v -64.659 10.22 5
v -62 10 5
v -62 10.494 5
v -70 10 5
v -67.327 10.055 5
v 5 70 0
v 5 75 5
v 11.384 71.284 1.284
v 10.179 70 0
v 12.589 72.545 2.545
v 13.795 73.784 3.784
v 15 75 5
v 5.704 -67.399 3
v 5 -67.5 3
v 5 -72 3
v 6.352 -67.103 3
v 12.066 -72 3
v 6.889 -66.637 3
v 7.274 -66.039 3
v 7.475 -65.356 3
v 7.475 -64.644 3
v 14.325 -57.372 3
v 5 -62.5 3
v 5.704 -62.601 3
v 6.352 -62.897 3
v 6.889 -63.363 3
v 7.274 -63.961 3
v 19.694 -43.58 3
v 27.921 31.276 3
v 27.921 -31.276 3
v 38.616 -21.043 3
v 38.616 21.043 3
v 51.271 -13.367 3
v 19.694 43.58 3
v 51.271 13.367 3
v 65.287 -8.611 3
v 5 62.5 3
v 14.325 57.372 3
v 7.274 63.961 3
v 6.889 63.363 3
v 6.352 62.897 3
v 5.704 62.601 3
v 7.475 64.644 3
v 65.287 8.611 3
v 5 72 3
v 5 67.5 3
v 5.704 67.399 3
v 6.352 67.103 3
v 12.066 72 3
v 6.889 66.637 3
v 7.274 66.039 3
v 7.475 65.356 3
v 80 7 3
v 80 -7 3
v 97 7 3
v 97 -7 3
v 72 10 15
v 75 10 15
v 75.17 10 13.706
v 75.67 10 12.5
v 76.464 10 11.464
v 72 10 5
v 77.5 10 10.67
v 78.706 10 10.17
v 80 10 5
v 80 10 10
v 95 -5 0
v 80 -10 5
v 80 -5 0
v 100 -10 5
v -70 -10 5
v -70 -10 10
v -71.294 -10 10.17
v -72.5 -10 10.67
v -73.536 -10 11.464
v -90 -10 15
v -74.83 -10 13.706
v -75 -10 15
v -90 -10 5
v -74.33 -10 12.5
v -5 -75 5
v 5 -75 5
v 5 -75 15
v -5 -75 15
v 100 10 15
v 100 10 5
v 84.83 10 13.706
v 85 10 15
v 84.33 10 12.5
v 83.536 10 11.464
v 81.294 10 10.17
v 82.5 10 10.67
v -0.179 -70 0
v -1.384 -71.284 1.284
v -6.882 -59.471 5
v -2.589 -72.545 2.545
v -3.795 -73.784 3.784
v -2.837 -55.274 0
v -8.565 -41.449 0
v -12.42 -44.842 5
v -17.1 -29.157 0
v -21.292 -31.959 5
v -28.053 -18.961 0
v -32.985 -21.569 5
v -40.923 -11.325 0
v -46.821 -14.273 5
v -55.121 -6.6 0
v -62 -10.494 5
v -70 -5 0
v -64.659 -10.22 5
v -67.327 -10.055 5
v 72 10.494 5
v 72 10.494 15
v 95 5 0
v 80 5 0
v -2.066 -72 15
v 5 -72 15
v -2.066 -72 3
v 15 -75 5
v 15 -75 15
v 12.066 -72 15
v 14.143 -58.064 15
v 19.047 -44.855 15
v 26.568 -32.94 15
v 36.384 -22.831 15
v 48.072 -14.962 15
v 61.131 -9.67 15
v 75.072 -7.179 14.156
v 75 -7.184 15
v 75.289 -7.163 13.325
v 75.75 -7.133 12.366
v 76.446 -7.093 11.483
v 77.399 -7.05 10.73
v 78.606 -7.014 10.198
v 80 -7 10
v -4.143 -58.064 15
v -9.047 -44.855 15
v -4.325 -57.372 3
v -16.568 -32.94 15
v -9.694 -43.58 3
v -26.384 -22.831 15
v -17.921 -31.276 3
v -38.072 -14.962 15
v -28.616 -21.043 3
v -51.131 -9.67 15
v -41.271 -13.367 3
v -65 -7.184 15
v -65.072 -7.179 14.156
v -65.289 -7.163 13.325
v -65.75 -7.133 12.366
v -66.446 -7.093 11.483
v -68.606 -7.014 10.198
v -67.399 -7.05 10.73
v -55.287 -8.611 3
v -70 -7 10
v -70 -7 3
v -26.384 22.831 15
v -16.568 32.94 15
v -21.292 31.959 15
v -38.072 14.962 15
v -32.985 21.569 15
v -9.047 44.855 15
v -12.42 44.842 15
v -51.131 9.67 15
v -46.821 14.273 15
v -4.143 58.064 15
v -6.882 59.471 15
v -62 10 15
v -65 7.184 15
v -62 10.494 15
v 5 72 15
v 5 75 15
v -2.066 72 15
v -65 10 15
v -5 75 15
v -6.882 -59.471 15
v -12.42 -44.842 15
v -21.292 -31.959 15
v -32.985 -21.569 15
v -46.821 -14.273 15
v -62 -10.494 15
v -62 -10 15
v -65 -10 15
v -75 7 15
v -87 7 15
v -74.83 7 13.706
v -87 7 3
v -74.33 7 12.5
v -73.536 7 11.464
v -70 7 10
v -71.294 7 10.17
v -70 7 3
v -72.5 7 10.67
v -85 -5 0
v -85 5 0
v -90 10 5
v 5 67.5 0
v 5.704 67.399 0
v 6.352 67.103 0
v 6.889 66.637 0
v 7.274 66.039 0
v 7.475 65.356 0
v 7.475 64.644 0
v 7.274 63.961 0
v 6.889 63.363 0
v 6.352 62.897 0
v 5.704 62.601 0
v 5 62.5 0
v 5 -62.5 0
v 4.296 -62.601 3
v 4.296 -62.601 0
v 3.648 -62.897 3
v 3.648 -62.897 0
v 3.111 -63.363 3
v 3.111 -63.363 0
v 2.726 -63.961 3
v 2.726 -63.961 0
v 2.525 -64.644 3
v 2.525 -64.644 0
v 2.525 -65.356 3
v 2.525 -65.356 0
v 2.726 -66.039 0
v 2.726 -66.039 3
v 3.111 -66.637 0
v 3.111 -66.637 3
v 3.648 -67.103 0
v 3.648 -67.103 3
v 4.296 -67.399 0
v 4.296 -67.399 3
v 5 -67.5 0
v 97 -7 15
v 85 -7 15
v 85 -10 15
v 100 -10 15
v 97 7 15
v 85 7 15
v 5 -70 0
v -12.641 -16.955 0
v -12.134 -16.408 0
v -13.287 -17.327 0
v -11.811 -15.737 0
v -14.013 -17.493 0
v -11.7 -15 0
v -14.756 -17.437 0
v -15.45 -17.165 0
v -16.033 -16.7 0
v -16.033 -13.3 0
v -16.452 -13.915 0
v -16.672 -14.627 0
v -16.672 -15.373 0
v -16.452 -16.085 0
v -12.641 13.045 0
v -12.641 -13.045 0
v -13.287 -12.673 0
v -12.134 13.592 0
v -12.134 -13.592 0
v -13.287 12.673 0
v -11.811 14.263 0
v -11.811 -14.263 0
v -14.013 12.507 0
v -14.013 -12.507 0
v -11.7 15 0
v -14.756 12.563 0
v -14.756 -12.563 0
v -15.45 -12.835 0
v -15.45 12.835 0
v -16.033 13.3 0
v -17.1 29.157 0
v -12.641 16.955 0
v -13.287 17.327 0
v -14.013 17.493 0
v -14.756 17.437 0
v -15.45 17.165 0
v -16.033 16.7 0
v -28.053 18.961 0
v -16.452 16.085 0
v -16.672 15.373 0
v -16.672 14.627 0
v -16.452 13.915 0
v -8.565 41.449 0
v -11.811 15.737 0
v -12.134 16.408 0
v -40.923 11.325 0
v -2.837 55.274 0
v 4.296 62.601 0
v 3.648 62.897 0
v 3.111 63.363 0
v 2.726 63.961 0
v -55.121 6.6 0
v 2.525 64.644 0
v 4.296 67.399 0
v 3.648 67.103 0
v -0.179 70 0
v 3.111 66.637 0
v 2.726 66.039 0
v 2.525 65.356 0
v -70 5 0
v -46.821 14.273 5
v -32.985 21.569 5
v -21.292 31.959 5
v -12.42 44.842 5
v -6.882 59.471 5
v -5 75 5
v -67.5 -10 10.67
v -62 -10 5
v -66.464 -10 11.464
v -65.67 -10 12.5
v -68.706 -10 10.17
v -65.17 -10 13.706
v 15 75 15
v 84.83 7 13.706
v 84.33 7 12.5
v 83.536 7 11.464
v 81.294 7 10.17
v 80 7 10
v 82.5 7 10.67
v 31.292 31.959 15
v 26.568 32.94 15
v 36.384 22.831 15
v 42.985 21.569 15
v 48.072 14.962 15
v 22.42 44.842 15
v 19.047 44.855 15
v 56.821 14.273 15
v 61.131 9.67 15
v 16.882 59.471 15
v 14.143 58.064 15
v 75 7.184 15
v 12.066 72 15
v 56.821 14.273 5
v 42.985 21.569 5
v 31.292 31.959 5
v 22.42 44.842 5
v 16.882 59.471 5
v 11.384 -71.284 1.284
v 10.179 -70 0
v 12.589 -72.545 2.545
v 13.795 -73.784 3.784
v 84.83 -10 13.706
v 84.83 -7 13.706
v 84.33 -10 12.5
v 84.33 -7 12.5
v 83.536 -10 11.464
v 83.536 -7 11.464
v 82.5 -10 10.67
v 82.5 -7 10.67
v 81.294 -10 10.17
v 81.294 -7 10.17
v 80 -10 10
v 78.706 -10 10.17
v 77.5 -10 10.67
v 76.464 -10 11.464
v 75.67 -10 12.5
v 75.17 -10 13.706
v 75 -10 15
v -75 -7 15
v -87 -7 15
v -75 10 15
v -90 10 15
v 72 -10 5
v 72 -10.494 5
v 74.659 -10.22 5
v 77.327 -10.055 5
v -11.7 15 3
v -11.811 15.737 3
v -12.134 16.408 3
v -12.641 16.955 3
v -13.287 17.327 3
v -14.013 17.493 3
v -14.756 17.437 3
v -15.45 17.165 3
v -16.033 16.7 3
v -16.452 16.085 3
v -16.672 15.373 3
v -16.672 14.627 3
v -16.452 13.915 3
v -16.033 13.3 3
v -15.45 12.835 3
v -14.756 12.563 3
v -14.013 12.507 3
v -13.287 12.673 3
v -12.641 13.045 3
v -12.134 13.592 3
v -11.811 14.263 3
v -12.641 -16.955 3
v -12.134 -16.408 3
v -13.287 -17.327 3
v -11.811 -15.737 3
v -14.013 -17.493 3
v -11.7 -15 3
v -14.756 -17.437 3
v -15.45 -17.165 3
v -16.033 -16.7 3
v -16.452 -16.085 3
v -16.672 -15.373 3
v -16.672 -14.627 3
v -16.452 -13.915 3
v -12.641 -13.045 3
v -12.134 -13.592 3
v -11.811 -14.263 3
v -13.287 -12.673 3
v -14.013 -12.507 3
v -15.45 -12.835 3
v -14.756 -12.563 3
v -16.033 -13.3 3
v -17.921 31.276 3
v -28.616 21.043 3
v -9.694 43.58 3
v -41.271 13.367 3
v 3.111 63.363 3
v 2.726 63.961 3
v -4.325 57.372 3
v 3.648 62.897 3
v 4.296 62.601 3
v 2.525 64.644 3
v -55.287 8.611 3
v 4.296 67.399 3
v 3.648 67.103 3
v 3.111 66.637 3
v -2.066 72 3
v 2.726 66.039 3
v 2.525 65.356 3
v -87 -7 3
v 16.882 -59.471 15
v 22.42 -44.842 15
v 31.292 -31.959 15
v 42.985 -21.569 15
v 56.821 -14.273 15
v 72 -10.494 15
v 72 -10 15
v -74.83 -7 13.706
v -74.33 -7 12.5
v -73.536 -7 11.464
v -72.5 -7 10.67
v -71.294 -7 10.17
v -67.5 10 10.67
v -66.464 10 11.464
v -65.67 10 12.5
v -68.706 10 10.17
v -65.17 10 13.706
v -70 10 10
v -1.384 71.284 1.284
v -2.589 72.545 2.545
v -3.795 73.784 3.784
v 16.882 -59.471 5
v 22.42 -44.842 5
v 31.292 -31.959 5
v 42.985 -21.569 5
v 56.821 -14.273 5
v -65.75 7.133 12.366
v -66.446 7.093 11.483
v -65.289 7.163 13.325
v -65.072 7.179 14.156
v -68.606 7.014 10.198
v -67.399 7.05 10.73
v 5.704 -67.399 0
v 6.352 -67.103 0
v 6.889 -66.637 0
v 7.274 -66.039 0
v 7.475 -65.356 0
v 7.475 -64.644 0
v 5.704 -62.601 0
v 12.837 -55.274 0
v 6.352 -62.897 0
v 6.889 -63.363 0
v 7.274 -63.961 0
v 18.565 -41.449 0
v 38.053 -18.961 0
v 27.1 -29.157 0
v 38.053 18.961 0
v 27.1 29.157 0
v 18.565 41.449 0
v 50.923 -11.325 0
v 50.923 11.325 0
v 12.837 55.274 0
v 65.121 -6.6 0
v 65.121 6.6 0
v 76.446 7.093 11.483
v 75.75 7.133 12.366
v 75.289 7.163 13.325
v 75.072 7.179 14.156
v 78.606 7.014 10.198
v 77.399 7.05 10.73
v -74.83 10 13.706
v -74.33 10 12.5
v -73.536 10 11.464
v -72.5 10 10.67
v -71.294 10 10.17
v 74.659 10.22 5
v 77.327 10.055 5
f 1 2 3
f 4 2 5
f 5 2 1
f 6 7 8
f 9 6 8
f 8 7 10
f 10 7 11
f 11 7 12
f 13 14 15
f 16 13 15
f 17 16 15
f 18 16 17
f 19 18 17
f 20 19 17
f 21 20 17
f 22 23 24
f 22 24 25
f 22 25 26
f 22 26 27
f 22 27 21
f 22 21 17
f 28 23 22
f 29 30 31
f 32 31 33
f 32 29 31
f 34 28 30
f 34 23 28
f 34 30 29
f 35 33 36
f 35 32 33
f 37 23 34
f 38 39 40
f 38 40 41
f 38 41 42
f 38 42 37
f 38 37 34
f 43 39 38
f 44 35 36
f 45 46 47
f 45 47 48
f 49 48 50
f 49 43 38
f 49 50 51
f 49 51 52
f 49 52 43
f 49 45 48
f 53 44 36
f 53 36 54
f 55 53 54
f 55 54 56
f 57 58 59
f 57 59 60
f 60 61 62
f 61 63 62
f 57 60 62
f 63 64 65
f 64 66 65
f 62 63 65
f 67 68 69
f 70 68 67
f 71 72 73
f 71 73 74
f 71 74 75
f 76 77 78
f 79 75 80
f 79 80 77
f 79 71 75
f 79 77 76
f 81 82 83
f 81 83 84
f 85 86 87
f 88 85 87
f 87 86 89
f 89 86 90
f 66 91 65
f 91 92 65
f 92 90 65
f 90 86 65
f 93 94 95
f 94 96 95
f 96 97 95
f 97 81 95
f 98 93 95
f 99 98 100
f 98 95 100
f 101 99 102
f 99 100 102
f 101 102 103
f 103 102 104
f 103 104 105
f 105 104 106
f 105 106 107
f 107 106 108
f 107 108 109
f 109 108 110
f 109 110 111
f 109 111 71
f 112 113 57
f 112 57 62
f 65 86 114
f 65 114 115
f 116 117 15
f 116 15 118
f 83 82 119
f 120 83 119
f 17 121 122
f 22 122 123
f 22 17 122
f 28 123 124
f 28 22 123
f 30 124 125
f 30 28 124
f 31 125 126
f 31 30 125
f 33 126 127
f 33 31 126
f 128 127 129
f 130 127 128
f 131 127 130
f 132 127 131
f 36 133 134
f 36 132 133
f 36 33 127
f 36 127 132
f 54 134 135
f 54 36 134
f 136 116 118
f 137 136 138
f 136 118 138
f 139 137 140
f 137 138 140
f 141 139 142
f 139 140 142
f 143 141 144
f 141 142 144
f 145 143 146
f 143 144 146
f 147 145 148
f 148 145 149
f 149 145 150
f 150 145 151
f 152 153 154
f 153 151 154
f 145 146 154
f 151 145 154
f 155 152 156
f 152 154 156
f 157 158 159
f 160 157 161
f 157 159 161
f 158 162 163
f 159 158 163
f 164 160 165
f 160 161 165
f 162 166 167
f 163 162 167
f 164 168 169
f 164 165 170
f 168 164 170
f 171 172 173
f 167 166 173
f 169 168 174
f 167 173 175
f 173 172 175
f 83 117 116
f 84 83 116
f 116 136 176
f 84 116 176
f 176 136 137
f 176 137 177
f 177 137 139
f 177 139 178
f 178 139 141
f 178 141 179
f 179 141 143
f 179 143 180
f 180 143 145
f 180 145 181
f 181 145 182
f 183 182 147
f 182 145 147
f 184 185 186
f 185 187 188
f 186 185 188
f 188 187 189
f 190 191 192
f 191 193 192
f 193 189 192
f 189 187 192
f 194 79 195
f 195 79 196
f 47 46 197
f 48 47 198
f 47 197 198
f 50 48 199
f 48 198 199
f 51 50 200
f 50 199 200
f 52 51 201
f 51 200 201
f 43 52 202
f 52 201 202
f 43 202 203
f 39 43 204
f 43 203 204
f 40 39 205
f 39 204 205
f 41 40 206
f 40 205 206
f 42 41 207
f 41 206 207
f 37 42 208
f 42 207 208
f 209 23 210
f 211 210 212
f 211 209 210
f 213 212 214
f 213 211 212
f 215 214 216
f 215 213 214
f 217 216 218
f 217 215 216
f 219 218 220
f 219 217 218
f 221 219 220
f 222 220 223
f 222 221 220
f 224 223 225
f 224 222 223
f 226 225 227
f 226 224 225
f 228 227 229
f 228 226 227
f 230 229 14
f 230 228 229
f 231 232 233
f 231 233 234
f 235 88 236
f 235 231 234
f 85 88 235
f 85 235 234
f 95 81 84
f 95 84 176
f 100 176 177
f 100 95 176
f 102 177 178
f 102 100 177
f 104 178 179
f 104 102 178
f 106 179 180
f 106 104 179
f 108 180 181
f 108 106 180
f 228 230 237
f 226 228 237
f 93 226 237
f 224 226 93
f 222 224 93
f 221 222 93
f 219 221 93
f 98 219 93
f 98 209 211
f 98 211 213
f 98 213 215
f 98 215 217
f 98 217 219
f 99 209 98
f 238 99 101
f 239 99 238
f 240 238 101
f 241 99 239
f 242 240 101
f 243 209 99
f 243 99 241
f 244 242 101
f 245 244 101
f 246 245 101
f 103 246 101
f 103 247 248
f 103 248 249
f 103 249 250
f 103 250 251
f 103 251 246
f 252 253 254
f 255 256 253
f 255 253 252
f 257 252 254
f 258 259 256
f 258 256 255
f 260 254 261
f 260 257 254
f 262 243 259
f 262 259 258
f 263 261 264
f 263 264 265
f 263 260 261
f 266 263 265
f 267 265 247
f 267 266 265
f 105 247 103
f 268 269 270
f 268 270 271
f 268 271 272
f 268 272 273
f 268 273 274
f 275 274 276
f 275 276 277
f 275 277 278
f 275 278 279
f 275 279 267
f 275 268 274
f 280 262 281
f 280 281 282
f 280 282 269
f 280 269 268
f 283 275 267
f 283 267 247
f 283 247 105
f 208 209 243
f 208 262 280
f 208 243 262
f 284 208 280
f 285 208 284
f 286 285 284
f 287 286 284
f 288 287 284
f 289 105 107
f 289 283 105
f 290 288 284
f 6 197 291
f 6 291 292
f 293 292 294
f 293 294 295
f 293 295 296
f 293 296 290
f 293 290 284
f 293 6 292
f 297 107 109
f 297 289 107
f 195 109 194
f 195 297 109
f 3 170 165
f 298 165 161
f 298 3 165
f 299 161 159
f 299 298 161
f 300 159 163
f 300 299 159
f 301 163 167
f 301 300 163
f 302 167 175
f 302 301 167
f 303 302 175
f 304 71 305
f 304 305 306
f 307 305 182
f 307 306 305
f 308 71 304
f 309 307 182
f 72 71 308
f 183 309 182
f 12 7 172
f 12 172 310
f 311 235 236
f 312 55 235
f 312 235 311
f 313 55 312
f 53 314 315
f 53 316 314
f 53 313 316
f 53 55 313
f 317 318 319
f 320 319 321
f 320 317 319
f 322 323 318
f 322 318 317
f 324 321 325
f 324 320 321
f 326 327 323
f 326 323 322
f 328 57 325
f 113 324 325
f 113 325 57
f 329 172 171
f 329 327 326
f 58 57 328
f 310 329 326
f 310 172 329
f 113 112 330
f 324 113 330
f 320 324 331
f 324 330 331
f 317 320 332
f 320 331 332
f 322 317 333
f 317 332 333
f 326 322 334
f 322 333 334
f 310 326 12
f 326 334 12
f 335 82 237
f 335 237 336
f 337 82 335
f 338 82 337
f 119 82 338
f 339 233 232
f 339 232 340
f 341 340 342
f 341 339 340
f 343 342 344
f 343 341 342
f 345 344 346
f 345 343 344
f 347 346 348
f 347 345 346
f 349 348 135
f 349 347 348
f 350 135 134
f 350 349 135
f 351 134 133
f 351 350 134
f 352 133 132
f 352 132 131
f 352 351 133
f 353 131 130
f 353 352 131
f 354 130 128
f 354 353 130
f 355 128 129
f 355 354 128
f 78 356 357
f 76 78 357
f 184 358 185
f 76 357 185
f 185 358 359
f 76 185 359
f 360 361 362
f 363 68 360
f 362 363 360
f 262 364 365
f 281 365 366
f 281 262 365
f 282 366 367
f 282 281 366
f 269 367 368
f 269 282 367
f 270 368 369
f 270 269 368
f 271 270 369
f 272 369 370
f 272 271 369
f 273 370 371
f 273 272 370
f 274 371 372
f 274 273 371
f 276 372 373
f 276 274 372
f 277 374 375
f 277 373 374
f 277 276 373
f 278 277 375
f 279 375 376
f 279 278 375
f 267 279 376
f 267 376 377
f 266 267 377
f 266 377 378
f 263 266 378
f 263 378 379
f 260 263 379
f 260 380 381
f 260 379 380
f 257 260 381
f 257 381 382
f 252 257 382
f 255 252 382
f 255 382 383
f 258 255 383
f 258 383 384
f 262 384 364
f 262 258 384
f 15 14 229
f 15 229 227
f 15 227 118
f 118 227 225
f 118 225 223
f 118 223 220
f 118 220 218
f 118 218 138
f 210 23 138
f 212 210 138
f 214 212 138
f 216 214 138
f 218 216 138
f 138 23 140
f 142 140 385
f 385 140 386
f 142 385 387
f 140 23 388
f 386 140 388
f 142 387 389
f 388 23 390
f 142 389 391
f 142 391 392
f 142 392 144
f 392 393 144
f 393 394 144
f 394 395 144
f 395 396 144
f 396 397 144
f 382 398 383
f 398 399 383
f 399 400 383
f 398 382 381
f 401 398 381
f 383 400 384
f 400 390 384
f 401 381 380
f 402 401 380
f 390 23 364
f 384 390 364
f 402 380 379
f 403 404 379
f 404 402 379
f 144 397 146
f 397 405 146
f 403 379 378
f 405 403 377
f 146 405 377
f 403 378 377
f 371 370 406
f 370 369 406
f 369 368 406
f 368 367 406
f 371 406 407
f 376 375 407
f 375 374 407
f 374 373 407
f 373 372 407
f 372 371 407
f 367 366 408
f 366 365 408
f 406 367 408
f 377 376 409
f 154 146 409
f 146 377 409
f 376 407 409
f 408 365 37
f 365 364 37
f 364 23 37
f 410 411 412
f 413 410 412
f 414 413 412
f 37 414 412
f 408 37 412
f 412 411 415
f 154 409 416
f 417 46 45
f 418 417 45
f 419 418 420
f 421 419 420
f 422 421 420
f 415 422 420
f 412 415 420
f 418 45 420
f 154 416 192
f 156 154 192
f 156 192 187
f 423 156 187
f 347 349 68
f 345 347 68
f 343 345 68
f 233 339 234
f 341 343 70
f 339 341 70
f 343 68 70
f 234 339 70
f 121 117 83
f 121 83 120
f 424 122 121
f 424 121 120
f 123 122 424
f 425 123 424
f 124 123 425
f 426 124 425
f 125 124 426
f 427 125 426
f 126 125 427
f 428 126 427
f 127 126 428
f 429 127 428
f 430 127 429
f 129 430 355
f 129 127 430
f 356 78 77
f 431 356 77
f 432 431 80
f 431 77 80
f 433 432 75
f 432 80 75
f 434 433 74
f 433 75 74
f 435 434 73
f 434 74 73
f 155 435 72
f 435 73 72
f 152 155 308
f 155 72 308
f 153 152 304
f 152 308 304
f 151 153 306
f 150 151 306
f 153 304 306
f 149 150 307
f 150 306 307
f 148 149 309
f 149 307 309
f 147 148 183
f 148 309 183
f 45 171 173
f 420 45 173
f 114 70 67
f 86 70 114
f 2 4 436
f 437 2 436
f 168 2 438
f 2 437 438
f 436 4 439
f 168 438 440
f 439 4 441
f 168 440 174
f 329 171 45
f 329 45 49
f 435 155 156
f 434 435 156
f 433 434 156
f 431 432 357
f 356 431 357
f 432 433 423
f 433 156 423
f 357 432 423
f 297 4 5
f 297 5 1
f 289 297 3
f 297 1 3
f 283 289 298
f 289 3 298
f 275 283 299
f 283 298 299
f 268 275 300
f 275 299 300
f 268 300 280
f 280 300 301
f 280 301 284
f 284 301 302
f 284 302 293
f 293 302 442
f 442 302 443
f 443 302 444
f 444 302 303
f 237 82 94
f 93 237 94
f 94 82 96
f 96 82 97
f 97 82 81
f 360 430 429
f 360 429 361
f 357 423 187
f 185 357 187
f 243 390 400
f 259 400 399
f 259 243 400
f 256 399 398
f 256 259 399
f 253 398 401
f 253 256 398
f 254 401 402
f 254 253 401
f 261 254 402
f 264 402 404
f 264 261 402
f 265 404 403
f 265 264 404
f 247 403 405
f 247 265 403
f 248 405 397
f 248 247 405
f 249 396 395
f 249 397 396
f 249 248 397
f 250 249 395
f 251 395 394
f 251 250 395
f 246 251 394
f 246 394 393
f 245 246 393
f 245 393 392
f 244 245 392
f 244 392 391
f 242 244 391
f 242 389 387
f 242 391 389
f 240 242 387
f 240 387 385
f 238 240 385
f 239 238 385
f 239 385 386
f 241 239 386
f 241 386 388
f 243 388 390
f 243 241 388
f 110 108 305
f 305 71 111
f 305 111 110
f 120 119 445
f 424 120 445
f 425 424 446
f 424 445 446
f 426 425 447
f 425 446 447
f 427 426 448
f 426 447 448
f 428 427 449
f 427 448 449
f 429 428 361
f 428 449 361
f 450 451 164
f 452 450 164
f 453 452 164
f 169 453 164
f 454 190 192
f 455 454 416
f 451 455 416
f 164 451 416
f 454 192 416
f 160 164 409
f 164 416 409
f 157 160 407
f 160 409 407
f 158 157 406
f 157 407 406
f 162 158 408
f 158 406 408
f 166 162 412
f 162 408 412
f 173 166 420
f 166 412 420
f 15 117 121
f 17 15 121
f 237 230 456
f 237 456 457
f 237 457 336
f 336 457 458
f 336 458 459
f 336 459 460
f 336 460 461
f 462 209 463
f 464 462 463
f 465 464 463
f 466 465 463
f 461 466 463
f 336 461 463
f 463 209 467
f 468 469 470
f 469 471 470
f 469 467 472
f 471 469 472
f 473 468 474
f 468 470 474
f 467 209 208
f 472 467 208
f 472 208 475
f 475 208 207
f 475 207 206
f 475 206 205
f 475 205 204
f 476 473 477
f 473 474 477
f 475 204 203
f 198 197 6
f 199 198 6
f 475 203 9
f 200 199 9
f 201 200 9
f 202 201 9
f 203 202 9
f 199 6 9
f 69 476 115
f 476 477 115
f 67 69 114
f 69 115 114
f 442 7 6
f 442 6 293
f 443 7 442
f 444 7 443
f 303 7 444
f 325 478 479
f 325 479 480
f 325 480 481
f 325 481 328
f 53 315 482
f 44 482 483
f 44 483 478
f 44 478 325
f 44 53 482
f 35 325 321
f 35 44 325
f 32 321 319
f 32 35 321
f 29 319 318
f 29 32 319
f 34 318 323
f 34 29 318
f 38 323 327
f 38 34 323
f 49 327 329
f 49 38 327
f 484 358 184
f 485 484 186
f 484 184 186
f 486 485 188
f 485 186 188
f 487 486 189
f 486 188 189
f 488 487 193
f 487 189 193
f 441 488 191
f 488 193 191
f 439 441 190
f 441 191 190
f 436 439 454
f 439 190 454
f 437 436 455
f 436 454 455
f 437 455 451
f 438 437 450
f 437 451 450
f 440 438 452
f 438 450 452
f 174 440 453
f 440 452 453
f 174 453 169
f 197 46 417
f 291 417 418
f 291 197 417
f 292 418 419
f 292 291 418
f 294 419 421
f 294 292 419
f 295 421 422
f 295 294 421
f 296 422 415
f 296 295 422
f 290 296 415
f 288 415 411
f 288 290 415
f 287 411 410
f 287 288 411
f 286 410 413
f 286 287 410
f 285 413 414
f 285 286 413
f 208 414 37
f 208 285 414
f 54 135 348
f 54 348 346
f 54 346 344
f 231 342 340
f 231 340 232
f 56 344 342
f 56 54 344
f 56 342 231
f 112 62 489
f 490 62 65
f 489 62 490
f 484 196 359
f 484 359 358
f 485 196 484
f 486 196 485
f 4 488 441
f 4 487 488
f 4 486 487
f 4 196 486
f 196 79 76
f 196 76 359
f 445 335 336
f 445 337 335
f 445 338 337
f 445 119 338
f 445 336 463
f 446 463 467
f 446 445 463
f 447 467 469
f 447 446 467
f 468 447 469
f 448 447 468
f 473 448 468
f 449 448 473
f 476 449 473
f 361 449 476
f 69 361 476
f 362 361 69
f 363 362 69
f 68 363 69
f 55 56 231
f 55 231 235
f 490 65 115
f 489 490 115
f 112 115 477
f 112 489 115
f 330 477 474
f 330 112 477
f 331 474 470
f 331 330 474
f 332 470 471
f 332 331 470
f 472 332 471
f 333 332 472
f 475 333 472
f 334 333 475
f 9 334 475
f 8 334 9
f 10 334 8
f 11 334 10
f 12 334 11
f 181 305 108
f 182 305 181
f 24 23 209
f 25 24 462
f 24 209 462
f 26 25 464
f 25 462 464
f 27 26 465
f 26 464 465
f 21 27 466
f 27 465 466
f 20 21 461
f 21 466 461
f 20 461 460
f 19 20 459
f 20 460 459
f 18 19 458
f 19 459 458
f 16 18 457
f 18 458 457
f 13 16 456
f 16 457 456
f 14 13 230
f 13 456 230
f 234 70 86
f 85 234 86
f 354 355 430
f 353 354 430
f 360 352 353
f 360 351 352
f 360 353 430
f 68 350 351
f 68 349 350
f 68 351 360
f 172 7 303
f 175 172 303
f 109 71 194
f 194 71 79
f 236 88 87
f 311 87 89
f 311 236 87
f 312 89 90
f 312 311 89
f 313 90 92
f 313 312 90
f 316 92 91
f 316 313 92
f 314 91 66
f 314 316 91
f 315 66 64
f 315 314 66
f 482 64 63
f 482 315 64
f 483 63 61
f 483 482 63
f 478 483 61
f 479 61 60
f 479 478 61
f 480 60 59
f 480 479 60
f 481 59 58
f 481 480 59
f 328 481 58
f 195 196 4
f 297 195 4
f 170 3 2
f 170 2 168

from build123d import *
from build123d.topology import SkipClean

# Parameters (mm, degrees)
SKETCH1_W               = 200
SKETCH1_H               = 150
BOSS_EXTRUDE1_DEPTH     = 15
CUT_EXTRUDE2_DEPTH      = 30
SHELL2_T                = -3
SKETCH6_R               = 2.5
CUT_EXTRUDE3_DEPTH      = 30
CUT_EXTRUDE4_DEPTH      = 30
CUT_EXTRUDE4_DEPTH_BACK = 30
SKETCH7_R               = 5
CHAMFER1_SIZE           = 5
SKETCH8_R               = 2.5
CUT_EXTRUDE5_DEPTH      = 10
SKETCH9_W               = 105
SKETCH9_H               = 150
CUT_EXTRUDE8_DEPTH      = 50
SKETCH10_R              = 2.5
CUT_EXTRUDE9_DEPTH      = 50
SKETCH11_W              = 10
SKETCH11_H              = 2.828590786
CUT_EXTRUDE10_DEPTH     = 28
SKETCH12_W              = 10
SKETCH12_H              = 3.286754743
SKETCH12_H_2            = 3.432076944
CUT_EXTRUDE11_DEPTH     = 28


with BuildPart() as part:
    # Sketch1 → Boss-Extrude1 (new body)
    with BuildSketch(Plane.XY):
        Rectangle(SKETCH1_W, SKETCH1_H)
    extrude(amount=BOSS_EXTRUDE1_DEPTH)

    # Sketch5 → Cut-Extrude2 (cut)
    with BuildSketch(Plane(origin=(0, 0, 0), x_dir=(-1, 0, 0), z_dir=(0, 0, -1))):
        with BuildLine():
            Line((100, 75), (5, 75))
            ThreePointArc((5, 75), (24.038059223, 29.038059223), (70, 10))
            Line((70, 10), (100, 10))
            Line((100, 10), (100, 75))
        make_face()
        with BuildLine():
            ThreePointArc((70, -10), (24.038059223, -29.038059223), (5, -75))
            Line((5, -75), (100, -75))
            Line((100, -75), (100, -10))
            Line((100, -10), (70, -10))
        make_face()
        with BuildLine():
            Line((-80, -10), (-100, -10))
            Line((-100, -10), (-100, -75))
            Line((-100, -75), (-15, -75))
            ThreePointArc((-15, -75), (-34.038059223, -29.038059223), (-80, -10))
        make_face()
        with BuildLine():
            Line((-100, 75), (-100, 10))
            Line((-100, 10), (-80, 10))
            ThreePointArc((-80, 10), (-34.038059223, 29.038059223), (-15, 75))
            Line((-15, 75), (-100, 75))
        make_face()
    extrude(amount=-CUT_EXTRUDE2_DEPTH, mode=Mode.SUBTRACT)

    # Shell2
    shell2_openings = [part.faces().sort_by_distance(p)[0] for p in [
        (3.044348512, 0, 15),
    ]]
    offset(amount=SHELL2_T, openings=shell2_openings, kind=Kind.INTERSECTION)

    # Sketch6 → Cut-Extrude3 (cut)
    with BuildSketch(Plane(origin=(0, 0, 0), x_dir=(-1, 0, 0), z_dir=(0, 0, -1))):
        with Locations((-5, 65)):
            Circle(SKETCH6_R)
        with Locations((-5, -65)):
            Circle(SKETCH6_R)
    extrude(amount=-CUT_EXTRUDE3_DEPTH, mode=Mode.SUBTRACT)

    # Sketch7 → Cut-Extrude4 (cut, two sides: drawn at the far end of the back side and taken through both)
    with BuildSketch(Plane(origin=(0, 0, 0), x_dir=(1, 0, 0), z_dir=(0, 1, 0)).offset(-CUT_EXTRUDE4_DEPTH_BACK)):
        with Locations((-80, -15)):
            Circle(SKETCH7_R)
        with Locations((80, -15)):
            Circle(SKETCH7_R)
    extrude(amount=CUT_EXTRUDE4_DEPTH + CUT_EXTRUDE4_DEPTH_BACK, mode=Mode.SUBTRACT)

    # Chamfer1
    chamfer1_edges = [part.edges().sort_by_distance(p)[0] for p in [
        (-100, 0, 0),
        (5, 75, 0),
        (100, 0, 0),
        (5, -75, 0),
        (90, 10, 0),
        (34.038059223, 29.038059223, 0),
        (34.038059223, -29.038059223, 0),
        (90, -10, 0),
        (-24.038059223, -29.038059223, 0),
        (-85, -10, 0),
        (-24.038059223, 29.038059223, 0),
        (-85, 10, 0),
    ]]
    chamfer(chamfer1_edges, length=CHAMFER1_SIZE)

    # Sketch8 → Cut-Extrude5 (cut)
    with BuildSketch(Plane.XY.offset(3)):
        with Locations((-22, 15)):
            Circle(SKETCH8_R)
        with Locations((-22, -15)):
            Circle(SKETCH8_R)
    extrude(amount=-CUT_EXTRUDE5_DEPTH, mode=Mode.SUBTRACT)

    # Sketch9 → Cut-Extrude8 (cut)
    with BuildSketch(Plane.XY):
        with Locations((-47.5, 0)):
            Rectangle(SKETCH9_W, SKETCH9_H)
    extrude(amount=CUT_EXTRUDE8_DEPTH, mode=Mode.SUBTRACT)

    # Mirror4: part across plane


with BuildPart() as part_1:
    with SkipClean():  # the faces are left unmerged after this step: merging them gives an invalid solid
        add(part.part)
        add(part.part.mirror(Plane(origin=(5, 75, 50), x_dir=(0, 0, 1), z_dir=(-1, 0, 0))))

    # Sketch10 → Cut-Extrude9 (cut)
    with SkipClean():  # the faces are left unmerged after this step: merging them gives an invalid solid
        with BuildSketch(Plane.XY):
            with Locations((-14.2, 15)):
                Circle(SKETCH10_R)
            with Locations((-14.2, -15)):
                Circle(SKETCH10_R)
        extrude(amount=CUT_EXTRUDE9_DEPTH, mode=Mode.SUBTRACT)

    # Sketch11 → Cut-Extrude10 (cut)
    with SkipClean():  # the faces are left unmerged after this step: merging them gives an invalid solid
        with BuildSketch(Plane.ZY.offset(90)):
            with Locations((10, 11.414295393)):
                Rectangle(SKETCH11_W, SKETCH11_H)
            with Locations((10, -11.414295393)):
                Rectangle(SKETCH11_W, SKETCH11_H)
        extrude(amount=-CUT_EXTRUDE10_DEPTH, mode=Mode.SUBTRACT)

    # Sketch12 → Cut-Extrude11 (cut)
    with SkipClean():  # the faces are left unmerged after this step: merging them gives an invalid solid
        with BuildSketch(Plane(origin=(100, 0, 0), x_dir=(0, 0, -1), z_dir=(1, 0, 0))):
            with Locations((-10, -11.643377372)):
                Rectangle(SKETCH12_W, SKETCH12_H)
            with Locations((-10, 11.716038472)):
                Rectangle(SKETCH12_W, SKETCH12_H_2)
        extrude(amount=-CUT_EXTRUDE11_DEPTH, mode=Mode.SUBTRACT)


solid = part_1.part
